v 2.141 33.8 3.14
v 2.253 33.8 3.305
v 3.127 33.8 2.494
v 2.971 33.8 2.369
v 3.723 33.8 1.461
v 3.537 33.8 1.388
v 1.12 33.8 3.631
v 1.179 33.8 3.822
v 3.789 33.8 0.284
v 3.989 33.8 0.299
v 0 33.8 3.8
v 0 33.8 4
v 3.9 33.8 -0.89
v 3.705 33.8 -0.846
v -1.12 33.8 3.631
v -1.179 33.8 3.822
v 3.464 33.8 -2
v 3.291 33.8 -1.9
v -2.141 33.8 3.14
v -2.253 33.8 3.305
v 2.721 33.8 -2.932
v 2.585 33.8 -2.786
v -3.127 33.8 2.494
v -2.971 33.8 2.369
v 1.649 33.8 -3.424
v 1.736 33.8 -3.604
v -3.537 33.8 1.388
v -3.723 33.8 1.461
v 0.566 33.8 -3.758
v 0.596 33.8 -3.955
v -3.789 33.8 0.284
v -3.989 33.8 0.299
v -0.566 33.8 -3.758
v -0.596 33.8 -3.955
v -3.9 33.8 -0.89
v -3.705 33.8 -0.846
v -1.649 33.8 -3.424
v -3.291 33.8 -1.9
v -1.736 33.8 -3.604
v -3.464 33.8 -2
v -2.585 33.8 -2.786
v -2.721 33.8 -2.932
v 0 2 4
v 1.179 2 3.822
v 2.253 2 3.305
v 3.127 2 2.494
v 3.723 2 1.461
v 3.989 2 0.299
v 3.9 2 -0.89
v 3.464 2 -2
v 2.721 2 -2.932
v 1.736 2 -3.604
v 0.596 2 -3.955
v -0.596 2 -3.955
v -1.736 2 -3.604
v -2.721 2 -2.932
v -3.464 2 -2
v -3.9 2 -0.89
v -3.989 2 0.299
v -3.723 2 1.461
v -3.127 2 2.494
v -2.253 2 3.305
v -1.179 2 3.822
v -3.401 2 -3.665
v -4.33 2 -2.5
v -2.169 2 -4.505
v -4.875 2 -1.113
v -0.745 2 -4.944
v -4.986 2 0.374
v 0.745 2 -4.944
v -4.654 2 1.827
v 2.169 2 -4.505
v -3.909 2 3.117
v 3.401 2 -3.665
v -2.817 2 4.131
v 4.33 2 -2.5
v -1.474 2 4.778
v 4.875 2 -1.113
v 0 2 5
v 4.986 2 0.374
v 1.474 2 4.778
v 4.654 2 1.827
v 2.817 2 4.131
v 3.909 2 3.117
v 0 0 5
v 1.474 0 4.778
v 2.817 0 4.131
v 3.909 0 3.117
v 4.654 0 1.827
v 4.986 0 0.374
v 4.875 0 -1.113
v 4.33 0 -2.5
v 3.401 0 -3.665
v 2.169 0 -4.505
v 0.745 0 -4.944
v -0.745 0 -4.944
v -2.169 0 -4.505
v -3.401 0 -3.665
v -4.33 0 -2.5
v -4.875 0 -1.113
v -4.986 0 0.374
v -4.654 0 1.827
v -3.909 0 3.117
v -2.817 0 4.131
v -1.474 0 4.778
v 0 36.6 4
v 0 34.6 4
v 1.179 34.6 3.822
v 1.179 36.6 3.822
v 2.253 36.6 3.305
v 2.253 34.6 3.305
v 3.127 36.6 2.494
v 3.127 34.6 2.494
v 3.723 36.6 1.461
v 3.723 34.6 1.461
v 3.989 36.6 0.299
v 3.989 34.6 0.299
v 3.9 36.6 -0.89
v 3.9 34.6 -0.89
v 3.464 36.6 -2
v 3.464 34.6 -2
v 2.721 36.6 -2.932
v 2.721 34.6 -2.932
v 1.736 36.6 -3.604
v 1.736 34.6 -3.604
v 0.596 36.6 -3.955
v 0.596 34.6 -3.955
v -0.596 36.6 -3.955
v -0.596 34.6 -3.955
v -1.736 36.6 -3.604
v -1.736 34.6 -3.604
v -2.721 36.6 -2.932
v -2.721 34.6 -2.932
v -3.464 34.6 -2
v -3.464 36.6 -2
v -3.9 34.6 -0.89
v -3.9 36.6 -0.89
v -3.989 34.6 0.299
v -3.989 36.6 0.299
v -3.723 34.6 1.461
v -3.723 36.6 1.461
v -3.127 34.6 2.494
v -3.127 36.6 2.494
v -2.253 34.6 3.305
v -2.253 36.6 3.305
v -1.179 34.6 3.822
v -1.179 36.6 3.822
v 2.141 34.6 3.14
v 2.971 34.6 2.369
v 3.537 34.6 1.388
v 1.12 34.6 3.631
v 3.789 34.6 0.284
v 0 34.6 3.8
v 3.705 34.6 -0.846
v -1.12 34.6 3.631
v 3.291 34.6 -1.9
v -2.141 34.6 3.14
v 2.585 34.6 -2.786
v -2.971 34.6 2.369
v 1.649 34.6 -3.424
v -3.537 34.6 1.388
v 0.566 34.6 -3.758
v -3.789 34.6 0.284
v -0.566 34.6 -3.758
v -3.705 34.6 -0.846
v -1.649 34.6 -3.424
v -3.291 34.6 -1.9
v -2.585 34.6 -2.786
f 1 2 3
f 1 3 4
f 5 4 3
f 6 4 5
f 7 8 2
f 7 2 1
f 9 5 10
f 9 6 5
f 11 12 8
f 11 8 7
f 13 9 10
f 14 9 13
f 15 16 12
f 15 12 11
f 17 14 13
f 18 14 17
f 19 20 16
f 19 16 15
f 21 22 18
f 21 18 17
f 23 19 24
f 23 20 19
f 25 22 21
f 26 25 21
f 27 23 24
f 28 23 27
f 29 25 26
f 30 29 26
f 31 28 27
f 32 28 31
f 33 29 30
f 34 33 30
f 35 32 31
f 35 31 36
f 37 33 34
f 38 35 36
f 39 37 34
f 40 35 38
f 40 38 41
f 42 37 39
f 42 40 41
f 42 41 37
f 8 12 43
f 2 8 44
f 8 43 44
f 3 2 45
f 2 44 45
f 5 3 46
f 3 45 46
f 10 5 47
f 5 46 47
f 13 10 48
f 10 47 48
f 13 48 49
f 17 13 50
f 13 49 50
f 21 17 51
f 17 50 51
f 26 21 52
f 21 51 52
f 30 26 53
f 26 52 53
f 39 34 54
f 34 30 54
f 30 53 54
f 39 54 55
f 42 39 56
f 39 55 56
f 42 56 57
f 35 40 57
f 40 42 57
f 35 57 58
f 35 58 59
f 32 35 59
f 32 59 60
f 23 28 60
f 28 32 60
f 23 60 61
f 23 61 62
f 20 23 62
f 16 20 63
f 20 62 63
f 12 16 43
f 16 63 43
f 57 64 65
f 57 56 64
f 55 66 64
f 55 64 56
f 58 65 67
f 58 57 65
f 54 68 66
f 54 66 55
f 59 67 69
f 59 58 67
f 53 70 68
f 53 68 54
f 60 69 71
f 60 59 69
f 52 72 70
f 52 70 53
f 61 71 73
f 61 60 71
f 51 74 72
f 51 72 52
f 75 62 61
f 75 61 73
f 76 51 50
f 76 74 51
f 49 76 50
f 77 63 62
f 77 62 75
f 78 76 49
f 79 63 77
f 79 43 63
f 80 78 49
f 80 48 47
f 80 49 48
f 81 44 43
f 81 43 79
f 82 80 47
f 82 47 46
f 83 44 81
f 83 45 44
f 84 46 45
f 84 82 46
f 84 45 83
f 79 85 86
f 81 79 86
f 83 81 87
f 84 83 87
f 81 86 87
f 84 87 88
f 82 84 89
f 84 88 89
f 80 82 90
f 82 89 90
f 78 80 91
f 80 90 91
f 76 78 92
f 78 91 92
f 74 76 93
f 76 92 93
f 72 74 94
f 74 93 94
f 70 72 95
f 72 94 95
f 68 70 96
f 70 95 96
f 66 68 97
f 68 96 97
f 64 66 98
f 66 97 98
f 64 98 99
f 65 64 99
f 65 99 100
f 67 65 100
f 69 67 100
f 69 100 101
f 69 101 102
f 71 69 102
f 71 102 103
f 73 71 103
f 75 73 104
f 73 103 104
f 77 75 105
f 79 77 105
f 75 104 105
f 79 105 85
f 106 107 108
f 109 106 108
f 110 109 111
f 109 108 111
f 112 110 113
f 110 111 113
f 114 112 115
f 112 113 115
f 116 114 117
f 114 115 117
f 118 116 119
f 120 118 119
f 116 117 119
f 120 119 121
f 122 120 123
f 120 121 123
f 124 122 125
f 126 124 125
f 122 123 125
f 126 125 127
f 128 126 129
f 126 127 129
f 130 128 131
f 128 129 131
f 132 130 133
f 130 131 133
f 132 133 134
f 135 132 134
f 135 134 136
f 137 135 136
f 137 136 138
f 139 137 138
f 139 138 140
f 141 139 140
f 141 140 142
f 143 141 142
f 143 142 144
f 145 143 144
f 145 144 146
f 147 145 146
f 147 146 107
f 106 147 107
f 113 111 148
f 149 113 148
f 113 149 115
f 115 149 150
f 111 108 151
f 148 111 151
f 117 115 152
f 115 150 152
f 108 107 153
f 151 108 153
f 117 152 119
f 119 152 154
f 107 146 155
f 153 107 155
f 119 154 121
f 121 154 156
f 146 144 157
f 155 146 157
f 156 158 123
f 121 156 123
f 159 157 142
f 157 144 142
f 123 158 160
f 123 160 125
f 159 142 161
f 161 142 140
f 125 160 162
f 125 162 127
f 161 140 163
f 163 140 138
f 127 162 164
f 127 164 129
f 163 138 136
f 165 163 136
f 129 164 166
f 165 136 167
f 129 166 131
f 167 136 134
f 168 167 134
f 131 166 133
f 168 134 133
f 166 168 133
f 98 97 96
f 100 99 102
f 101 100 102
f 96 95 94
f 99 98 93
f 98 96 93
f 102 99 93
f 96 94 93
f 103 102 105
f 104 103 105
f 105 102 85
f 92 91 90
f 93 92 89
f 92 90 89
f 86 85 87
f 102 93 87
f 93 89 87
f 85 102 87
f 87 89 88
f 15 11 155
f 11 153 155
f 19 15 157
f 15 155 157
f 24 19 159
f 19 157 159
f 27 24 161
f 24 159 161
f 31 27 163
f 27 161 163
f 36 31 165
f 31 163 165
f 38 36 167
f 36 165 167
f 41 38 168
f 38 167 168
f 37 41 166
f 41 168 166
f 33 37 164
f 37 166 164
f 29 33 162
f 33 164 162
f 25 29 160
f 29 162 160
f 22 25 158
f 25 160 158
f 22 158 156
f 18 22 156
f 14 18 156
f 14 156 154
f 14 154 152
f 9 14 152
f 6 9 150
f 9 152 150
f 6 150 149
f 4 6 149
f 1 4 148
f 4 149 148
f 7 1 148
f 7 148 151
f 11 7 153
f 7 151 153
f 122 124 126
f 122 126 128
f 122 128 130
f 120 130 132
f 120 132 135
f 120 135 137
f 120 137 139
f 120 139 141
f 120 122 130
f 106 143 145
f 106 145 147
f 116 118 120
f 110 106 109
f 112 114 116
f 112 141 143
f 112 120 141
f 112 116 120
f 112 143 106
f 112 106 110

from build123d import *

# Parameters (mm, degrees)
SKETCH_1_R      = 5
EXTRUDE_1_DEPTH = 2
SKETCH_2_R      = 4
EXTRUDE_2_DEPTH = 34.6
SKETCH_3_W      = 0.4
SKETCH_3_H      = 0.8


with BuildPart() as part:
    # 草图1 → 凸台-拉伸1 (new body)
    with BuildSketch(Plane(origin=(0, 0, 0), x_dir=(1, 0, 0), z_dir=(0, 1, 0))):
        with Locations(Location((0, 0, 0), (0, 0, 270))):
            Circle(SKETCH_1_R)
    extrude(amount=EXTRUDE_1_DEPTH)

    # 草图2 → 凸台-拉伸2 (add)
    with BuildSketch(Plane(origin=(0, 2, 0), x_dir=(1, 0, 0), z_dir=(0, 1, 0))):
        with Locations(Location((0, 0, 0), (0, 0, 270))):
            Circle(SKETCH_2_R)
    extrude(amount=EXTRUDE_2_DEPTH)

    # 草图3 → 切除-旋转1 (revolve, cut)
    with BuildSketch(Plane.XY, mode=Mode.PRIVATE) as cut_revolve_1_sk:
        with Locations((4, 34.2)):
            Rectangle(SKETCH_3_W, SKETCH_3_H)
    revolve(cut_revolve_1_sk.sketch.rotate(Axis((0, 36.6, 0), (0, -1, 0)), 90), axis=Axis((0, 36.6, 0), (0, -1, 0)), mode=Mode.SUBTRACT)


solid = part.part
